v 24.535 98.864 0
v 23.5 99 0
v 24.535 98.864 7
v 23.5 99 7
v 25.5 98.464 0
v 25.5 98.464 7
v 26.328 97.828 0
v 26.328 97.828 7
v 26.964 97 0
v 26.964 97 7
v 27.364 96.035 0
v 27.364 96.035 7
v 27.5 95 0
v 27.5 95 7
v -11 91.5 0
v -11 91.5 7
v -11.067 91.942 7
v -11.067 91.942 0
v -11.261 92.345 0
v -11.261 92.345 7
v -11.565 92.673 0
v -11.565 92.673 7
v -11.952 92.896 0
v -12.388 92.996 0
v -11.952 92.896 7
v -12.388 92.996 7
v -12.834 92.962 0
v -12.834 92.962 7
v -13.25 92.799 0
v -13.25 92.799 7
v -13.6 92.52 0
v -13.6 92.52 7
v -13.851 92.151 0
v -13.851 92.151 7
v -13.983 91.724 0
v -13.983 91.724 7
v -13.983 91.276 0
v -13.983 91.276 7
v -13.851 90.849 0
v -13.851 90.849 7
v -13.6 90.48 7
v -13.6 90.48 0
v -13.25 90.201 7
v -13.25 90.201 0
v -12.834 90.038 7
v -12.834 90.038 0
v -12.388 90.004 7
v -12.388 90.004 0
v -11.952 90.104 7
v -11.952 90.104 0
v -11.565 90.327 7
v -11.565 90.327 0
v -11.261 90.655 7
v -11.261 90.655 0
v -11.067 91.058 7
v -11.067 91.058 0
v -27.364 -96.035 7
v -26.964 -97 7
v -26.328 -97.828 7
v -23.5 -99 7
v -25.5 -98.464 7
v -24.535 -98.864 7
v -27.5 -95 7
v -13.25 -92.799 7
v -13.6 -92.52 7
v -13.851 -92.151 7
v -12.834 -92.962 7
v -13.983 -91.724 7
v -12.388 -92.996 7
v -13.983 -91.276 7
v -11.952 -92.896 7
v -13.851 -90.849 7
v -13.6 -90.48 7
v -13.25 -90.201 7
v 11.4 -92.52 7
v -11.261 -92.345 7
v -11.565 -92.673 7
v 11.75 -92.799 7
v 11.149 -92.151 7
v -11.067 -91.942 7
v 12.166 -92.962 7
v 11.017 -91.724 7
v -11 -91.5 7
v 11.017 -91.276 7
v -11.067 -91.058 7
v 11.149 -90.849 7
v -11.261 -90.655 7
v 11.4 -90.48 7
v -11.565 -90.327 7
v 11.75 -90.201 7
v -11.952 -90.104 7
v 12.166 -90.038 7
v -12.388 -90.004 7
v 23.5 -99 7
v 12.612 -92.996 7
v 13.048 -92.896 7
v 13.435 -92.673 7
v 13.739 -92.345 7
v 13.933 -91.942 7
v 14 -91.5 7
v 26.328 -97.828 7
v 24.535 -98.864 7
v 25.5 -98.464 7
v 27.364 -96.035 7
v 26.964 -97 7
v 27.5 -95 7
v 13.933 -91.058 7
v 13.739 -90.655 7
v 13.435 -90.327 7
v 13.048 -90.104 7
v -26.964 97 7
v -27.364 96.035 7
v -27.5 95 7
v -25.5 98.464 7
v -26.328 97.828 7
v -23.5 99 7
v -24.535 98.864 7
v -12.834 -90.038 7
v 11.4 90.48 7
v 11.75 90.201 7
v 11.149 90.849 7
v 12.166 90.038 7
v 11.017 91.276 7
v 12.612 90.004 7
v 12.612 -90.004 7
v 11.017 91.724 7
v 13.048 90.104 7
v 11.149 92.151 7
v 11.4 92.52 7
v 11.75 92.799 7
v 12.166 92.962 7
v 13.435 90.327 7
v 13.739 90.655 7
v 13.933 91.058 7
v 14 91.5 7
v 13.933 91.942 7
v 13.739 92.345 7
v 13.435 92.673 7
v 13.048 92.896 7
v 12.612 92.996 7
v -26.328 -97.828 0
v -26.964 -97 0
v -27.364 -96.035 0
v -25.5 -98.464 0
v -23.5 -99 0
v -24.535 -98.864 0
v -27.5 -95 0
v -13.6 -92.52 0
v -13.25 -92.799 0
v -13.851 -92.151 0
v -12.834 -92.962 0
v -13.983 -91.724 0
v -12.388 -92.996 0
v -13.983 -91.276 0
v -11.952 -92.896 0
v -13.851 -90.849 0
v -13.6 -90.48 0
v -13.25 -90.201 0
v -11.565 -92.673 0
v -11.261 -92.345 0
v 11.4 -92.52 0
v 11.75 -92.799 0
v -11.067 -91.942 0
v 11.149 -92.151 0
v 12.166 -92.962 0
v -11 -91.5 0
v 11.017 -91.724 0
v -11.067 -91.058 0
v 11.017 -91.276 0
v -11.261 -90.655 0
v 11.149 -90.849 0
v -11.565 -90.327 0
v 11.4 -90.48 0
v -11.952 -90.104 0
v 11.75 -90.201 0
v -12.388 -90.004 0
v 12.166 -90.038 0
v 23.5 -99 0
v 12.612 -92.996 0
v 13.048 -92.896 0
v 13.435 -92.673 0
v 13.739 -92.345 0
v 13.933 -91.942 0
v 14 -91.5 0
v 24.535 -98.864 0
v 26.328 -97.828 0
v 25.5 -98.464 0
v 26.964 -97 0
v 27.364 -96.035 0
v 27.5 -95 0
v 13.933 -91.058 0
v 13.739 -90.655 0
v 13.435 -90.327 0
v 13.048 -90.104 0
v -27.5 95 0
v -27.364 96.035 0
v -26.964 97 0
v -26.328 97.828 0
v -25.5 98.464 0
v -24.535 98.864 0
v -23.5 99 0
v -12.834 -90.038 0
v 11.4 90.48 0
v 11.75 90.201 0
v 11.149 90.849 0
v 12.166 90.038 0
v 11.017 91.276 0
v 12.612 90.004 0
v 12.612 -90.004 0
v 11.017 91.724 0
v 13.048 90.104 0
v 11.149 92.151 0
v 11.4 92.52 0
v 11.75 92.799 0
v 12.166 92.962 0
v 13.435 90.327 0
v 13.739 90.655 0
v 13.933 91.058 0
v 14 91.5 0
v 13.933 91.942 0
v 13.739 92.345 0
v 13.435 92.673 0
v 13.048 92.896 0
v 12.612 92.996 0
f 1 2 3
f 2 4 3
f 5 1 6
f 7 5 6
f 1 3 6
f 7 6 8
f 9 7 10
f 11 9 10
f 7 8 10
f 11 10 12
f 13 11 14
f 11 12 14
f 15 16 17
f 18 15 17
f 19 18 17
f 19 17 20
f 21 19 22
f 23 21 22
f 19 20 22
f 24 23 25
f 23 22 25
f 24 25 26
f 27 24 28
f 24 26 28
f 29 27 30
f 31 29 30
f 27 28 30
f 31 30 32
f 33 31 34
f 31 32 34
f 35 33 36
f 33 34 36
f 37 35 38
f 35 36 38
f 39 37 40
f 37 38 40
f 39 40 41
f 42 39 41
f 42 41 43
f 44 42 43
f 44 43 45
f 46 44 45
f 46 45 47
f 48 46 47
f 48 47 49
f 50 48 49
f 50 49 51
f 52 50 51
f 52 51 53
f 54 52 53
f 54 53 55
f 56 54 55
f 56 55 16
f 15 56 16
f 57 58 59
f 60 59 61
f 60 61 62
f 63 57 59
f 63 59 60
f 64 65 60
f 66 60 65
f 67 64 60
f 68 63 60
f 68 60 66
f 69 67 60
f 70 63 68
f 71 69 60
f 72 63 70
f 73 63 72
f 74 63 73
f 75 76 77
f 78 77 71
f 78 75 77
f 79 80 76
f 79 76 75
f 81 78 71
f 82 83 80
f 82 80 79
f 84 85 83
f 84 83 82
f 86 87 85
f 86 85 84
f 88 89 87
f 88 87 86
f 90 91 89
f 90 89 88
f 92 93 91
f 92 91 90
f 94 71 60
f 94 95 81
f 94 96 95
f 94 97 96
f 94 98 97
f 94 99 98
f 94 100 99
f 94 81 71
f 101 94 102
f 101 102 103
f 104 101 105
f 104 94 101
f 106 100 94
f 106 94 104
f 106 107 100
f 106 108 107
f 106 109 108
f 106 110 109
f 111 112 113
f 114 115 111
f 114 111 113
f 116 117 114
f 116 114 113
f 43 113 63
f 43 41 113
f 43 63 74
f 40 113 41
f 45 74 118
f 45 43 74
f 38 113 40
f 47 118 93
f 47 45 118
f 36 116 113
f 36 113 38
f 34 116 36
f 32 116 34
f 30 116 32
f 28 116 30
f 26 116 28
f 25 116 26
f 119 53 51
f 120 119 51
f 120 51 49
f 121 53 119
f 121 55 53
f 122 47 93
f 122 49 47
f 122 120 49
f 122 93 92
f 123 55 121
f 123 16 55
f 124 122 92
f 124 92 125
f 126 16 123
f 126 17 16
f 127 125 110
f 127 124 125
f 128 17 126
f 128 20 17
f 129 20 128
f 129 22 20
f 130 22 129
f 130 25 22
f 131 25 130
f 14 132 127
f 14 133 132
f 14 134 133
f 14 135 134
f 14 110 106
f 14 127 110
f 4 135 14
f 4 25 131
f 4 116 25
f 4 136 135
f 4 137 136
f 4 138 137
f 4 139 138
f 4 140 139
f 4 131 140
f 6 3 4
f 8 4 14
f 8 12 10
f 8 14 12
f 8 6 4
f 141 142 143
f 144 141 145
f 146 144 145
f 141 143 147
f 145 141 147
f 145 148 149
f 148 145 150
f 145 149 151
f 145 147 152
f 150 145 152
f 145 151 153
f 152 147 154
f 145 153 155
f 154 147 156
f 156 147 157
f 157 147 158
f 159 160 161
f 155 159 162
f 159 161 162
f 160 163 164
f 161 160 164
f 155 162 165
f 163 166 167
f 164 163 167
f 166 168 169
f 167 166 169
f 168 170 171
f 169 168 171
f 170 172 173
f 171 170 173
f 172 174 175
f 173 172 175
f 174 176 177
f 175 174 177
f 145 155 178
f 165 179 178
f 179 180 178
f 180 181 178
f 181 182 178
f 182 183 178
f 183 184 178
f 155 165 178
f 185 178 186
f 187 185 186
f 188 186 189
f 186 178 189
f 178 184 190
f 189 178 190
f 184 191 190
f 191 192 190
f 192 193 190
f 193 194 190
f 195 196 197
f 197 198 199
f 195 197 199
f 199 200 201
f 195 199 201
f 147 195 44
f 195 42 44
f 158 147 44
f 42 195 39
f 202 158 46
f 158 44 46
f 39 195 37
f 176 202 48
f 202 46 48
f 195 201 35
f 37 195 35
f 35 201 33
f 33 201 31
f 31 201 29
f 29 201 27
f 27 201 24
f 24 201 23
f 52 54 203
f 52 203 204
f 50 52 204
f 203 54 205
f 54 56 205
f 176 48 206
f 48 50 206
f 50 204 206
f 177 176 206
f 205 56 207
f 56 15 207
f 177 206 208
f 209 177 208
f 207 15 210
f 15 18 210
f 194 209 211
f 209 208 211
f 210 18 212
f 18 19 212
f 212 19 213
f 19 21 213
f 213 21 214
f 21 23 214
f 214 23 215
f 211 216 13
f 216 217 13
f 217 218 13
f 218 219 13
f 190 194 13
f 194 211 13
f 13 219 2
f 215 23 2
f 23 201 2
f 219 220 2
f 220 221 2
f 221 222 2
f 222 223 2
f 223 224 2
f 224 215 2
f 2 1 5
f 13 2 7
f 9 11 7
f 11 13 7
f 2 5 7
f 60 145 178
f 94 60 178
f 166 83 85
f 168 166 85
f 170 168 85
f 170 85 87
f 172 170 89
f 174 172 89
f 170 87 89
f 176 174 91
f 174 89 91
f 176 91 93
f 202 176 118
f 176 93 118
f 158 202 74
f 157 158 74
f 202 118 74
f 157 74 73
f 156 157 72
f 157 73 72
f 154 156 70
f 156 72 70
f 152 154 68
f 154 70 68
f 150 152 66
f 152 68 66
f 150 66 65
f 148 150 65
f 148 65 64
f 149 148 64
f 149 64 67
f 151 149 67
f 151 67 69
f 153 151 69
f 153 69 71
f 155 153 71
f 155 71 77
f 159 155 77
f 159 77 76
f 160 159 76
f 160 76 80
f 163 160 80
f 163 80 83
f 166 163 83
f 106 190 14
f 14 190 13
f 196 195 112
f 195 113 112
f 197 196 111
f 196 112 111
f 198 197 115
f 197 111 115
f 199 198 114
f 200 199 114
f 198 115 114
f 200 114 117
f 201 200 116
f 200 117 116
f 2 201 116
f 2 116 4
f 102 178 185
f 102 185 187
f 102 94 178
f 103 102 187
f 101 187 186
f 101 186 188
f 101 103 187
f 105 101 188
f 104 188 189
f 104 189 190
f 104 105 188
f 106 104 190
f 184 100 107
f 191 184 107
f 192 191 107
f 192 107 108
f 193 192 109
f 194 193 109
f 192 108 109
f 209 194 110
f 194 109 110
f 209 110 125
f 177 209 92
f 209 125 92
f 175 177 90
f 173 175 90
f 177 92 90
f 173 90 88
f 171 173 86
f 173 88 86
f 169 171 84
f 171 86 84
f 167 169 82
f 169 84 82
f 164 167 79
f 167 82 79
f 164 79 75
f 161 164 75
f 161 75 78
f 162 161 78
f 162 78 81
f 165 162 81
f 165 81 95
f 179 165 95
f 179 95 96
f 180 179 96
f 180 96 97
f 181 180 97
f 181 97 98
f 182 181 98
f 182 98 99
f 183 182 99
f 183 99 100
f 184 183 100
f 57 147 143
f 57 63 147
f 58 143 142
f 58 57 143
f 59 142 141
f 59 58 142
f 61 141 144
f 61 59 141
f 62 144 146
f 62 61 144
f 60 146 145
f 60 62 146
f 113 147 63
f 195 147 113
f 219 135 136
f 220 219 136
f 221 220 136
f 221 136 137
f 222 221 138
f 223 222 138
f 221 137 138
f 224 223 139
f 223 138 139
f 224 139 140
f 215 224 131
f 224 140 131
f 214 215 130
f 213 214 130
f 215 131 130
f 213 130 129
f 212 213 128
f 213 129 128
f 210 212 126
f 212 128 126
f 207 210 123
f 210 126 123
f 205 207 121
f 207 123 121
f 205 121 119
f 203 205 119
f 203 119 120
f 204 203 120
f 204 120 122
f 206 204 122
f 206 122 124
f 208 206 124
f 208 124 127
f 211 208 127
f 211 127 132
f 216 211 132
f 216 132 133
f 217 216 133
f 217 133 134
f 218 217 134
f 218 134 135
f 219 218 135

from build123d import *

# Parameters (mm, degrees)
SKETCH_W     = 55
SKETCH_H     = 198
PAD_DEPTH    = 7
SKETCH001_R  = 1.5
POCKET_DEPTH = 7.001
FILLET_R     = 4


with BuildPart() as part:
    # Sketch → Pad (new body)
    with BuildSketch(Plane.XY):
        Rectangle(SKETCH_W, SKETCH_H)
    extrude(amount=PAD_DEPTH)

    # Sketch001 (on Face6 of Pad) → Pocket (cut, through all)
    with BuildSketch(Plane.XY.offset(7)):
        with Locations((-12.5, 91.5)):
            Circle(SKETCH001_R)
        with Locations((12.5, 91.5)):
            Circle(SKETCH001_R)
        with Locations((-12.5, -91.5)):
            Circle(SKETCH001_R)
        with Locations((12.5, -91.5)):
            Circle(SKETCH001_R)
    extrude(amount=-POCKET_DEPTH, mode=Mode.SUBTRACT)

    # Fillet
    fillet_edges = [part.edges().sort_by_distance(p)[0] for p in [
        (-27.5, 99, 3.5),
        (-27.5, -99, 3.5),
        (27.5, -99, 3.5),
        (27.5, 99, 3.5),
    ]]
    fillet(fillet_edges, radius=FILLET_R)


solid = part.part
